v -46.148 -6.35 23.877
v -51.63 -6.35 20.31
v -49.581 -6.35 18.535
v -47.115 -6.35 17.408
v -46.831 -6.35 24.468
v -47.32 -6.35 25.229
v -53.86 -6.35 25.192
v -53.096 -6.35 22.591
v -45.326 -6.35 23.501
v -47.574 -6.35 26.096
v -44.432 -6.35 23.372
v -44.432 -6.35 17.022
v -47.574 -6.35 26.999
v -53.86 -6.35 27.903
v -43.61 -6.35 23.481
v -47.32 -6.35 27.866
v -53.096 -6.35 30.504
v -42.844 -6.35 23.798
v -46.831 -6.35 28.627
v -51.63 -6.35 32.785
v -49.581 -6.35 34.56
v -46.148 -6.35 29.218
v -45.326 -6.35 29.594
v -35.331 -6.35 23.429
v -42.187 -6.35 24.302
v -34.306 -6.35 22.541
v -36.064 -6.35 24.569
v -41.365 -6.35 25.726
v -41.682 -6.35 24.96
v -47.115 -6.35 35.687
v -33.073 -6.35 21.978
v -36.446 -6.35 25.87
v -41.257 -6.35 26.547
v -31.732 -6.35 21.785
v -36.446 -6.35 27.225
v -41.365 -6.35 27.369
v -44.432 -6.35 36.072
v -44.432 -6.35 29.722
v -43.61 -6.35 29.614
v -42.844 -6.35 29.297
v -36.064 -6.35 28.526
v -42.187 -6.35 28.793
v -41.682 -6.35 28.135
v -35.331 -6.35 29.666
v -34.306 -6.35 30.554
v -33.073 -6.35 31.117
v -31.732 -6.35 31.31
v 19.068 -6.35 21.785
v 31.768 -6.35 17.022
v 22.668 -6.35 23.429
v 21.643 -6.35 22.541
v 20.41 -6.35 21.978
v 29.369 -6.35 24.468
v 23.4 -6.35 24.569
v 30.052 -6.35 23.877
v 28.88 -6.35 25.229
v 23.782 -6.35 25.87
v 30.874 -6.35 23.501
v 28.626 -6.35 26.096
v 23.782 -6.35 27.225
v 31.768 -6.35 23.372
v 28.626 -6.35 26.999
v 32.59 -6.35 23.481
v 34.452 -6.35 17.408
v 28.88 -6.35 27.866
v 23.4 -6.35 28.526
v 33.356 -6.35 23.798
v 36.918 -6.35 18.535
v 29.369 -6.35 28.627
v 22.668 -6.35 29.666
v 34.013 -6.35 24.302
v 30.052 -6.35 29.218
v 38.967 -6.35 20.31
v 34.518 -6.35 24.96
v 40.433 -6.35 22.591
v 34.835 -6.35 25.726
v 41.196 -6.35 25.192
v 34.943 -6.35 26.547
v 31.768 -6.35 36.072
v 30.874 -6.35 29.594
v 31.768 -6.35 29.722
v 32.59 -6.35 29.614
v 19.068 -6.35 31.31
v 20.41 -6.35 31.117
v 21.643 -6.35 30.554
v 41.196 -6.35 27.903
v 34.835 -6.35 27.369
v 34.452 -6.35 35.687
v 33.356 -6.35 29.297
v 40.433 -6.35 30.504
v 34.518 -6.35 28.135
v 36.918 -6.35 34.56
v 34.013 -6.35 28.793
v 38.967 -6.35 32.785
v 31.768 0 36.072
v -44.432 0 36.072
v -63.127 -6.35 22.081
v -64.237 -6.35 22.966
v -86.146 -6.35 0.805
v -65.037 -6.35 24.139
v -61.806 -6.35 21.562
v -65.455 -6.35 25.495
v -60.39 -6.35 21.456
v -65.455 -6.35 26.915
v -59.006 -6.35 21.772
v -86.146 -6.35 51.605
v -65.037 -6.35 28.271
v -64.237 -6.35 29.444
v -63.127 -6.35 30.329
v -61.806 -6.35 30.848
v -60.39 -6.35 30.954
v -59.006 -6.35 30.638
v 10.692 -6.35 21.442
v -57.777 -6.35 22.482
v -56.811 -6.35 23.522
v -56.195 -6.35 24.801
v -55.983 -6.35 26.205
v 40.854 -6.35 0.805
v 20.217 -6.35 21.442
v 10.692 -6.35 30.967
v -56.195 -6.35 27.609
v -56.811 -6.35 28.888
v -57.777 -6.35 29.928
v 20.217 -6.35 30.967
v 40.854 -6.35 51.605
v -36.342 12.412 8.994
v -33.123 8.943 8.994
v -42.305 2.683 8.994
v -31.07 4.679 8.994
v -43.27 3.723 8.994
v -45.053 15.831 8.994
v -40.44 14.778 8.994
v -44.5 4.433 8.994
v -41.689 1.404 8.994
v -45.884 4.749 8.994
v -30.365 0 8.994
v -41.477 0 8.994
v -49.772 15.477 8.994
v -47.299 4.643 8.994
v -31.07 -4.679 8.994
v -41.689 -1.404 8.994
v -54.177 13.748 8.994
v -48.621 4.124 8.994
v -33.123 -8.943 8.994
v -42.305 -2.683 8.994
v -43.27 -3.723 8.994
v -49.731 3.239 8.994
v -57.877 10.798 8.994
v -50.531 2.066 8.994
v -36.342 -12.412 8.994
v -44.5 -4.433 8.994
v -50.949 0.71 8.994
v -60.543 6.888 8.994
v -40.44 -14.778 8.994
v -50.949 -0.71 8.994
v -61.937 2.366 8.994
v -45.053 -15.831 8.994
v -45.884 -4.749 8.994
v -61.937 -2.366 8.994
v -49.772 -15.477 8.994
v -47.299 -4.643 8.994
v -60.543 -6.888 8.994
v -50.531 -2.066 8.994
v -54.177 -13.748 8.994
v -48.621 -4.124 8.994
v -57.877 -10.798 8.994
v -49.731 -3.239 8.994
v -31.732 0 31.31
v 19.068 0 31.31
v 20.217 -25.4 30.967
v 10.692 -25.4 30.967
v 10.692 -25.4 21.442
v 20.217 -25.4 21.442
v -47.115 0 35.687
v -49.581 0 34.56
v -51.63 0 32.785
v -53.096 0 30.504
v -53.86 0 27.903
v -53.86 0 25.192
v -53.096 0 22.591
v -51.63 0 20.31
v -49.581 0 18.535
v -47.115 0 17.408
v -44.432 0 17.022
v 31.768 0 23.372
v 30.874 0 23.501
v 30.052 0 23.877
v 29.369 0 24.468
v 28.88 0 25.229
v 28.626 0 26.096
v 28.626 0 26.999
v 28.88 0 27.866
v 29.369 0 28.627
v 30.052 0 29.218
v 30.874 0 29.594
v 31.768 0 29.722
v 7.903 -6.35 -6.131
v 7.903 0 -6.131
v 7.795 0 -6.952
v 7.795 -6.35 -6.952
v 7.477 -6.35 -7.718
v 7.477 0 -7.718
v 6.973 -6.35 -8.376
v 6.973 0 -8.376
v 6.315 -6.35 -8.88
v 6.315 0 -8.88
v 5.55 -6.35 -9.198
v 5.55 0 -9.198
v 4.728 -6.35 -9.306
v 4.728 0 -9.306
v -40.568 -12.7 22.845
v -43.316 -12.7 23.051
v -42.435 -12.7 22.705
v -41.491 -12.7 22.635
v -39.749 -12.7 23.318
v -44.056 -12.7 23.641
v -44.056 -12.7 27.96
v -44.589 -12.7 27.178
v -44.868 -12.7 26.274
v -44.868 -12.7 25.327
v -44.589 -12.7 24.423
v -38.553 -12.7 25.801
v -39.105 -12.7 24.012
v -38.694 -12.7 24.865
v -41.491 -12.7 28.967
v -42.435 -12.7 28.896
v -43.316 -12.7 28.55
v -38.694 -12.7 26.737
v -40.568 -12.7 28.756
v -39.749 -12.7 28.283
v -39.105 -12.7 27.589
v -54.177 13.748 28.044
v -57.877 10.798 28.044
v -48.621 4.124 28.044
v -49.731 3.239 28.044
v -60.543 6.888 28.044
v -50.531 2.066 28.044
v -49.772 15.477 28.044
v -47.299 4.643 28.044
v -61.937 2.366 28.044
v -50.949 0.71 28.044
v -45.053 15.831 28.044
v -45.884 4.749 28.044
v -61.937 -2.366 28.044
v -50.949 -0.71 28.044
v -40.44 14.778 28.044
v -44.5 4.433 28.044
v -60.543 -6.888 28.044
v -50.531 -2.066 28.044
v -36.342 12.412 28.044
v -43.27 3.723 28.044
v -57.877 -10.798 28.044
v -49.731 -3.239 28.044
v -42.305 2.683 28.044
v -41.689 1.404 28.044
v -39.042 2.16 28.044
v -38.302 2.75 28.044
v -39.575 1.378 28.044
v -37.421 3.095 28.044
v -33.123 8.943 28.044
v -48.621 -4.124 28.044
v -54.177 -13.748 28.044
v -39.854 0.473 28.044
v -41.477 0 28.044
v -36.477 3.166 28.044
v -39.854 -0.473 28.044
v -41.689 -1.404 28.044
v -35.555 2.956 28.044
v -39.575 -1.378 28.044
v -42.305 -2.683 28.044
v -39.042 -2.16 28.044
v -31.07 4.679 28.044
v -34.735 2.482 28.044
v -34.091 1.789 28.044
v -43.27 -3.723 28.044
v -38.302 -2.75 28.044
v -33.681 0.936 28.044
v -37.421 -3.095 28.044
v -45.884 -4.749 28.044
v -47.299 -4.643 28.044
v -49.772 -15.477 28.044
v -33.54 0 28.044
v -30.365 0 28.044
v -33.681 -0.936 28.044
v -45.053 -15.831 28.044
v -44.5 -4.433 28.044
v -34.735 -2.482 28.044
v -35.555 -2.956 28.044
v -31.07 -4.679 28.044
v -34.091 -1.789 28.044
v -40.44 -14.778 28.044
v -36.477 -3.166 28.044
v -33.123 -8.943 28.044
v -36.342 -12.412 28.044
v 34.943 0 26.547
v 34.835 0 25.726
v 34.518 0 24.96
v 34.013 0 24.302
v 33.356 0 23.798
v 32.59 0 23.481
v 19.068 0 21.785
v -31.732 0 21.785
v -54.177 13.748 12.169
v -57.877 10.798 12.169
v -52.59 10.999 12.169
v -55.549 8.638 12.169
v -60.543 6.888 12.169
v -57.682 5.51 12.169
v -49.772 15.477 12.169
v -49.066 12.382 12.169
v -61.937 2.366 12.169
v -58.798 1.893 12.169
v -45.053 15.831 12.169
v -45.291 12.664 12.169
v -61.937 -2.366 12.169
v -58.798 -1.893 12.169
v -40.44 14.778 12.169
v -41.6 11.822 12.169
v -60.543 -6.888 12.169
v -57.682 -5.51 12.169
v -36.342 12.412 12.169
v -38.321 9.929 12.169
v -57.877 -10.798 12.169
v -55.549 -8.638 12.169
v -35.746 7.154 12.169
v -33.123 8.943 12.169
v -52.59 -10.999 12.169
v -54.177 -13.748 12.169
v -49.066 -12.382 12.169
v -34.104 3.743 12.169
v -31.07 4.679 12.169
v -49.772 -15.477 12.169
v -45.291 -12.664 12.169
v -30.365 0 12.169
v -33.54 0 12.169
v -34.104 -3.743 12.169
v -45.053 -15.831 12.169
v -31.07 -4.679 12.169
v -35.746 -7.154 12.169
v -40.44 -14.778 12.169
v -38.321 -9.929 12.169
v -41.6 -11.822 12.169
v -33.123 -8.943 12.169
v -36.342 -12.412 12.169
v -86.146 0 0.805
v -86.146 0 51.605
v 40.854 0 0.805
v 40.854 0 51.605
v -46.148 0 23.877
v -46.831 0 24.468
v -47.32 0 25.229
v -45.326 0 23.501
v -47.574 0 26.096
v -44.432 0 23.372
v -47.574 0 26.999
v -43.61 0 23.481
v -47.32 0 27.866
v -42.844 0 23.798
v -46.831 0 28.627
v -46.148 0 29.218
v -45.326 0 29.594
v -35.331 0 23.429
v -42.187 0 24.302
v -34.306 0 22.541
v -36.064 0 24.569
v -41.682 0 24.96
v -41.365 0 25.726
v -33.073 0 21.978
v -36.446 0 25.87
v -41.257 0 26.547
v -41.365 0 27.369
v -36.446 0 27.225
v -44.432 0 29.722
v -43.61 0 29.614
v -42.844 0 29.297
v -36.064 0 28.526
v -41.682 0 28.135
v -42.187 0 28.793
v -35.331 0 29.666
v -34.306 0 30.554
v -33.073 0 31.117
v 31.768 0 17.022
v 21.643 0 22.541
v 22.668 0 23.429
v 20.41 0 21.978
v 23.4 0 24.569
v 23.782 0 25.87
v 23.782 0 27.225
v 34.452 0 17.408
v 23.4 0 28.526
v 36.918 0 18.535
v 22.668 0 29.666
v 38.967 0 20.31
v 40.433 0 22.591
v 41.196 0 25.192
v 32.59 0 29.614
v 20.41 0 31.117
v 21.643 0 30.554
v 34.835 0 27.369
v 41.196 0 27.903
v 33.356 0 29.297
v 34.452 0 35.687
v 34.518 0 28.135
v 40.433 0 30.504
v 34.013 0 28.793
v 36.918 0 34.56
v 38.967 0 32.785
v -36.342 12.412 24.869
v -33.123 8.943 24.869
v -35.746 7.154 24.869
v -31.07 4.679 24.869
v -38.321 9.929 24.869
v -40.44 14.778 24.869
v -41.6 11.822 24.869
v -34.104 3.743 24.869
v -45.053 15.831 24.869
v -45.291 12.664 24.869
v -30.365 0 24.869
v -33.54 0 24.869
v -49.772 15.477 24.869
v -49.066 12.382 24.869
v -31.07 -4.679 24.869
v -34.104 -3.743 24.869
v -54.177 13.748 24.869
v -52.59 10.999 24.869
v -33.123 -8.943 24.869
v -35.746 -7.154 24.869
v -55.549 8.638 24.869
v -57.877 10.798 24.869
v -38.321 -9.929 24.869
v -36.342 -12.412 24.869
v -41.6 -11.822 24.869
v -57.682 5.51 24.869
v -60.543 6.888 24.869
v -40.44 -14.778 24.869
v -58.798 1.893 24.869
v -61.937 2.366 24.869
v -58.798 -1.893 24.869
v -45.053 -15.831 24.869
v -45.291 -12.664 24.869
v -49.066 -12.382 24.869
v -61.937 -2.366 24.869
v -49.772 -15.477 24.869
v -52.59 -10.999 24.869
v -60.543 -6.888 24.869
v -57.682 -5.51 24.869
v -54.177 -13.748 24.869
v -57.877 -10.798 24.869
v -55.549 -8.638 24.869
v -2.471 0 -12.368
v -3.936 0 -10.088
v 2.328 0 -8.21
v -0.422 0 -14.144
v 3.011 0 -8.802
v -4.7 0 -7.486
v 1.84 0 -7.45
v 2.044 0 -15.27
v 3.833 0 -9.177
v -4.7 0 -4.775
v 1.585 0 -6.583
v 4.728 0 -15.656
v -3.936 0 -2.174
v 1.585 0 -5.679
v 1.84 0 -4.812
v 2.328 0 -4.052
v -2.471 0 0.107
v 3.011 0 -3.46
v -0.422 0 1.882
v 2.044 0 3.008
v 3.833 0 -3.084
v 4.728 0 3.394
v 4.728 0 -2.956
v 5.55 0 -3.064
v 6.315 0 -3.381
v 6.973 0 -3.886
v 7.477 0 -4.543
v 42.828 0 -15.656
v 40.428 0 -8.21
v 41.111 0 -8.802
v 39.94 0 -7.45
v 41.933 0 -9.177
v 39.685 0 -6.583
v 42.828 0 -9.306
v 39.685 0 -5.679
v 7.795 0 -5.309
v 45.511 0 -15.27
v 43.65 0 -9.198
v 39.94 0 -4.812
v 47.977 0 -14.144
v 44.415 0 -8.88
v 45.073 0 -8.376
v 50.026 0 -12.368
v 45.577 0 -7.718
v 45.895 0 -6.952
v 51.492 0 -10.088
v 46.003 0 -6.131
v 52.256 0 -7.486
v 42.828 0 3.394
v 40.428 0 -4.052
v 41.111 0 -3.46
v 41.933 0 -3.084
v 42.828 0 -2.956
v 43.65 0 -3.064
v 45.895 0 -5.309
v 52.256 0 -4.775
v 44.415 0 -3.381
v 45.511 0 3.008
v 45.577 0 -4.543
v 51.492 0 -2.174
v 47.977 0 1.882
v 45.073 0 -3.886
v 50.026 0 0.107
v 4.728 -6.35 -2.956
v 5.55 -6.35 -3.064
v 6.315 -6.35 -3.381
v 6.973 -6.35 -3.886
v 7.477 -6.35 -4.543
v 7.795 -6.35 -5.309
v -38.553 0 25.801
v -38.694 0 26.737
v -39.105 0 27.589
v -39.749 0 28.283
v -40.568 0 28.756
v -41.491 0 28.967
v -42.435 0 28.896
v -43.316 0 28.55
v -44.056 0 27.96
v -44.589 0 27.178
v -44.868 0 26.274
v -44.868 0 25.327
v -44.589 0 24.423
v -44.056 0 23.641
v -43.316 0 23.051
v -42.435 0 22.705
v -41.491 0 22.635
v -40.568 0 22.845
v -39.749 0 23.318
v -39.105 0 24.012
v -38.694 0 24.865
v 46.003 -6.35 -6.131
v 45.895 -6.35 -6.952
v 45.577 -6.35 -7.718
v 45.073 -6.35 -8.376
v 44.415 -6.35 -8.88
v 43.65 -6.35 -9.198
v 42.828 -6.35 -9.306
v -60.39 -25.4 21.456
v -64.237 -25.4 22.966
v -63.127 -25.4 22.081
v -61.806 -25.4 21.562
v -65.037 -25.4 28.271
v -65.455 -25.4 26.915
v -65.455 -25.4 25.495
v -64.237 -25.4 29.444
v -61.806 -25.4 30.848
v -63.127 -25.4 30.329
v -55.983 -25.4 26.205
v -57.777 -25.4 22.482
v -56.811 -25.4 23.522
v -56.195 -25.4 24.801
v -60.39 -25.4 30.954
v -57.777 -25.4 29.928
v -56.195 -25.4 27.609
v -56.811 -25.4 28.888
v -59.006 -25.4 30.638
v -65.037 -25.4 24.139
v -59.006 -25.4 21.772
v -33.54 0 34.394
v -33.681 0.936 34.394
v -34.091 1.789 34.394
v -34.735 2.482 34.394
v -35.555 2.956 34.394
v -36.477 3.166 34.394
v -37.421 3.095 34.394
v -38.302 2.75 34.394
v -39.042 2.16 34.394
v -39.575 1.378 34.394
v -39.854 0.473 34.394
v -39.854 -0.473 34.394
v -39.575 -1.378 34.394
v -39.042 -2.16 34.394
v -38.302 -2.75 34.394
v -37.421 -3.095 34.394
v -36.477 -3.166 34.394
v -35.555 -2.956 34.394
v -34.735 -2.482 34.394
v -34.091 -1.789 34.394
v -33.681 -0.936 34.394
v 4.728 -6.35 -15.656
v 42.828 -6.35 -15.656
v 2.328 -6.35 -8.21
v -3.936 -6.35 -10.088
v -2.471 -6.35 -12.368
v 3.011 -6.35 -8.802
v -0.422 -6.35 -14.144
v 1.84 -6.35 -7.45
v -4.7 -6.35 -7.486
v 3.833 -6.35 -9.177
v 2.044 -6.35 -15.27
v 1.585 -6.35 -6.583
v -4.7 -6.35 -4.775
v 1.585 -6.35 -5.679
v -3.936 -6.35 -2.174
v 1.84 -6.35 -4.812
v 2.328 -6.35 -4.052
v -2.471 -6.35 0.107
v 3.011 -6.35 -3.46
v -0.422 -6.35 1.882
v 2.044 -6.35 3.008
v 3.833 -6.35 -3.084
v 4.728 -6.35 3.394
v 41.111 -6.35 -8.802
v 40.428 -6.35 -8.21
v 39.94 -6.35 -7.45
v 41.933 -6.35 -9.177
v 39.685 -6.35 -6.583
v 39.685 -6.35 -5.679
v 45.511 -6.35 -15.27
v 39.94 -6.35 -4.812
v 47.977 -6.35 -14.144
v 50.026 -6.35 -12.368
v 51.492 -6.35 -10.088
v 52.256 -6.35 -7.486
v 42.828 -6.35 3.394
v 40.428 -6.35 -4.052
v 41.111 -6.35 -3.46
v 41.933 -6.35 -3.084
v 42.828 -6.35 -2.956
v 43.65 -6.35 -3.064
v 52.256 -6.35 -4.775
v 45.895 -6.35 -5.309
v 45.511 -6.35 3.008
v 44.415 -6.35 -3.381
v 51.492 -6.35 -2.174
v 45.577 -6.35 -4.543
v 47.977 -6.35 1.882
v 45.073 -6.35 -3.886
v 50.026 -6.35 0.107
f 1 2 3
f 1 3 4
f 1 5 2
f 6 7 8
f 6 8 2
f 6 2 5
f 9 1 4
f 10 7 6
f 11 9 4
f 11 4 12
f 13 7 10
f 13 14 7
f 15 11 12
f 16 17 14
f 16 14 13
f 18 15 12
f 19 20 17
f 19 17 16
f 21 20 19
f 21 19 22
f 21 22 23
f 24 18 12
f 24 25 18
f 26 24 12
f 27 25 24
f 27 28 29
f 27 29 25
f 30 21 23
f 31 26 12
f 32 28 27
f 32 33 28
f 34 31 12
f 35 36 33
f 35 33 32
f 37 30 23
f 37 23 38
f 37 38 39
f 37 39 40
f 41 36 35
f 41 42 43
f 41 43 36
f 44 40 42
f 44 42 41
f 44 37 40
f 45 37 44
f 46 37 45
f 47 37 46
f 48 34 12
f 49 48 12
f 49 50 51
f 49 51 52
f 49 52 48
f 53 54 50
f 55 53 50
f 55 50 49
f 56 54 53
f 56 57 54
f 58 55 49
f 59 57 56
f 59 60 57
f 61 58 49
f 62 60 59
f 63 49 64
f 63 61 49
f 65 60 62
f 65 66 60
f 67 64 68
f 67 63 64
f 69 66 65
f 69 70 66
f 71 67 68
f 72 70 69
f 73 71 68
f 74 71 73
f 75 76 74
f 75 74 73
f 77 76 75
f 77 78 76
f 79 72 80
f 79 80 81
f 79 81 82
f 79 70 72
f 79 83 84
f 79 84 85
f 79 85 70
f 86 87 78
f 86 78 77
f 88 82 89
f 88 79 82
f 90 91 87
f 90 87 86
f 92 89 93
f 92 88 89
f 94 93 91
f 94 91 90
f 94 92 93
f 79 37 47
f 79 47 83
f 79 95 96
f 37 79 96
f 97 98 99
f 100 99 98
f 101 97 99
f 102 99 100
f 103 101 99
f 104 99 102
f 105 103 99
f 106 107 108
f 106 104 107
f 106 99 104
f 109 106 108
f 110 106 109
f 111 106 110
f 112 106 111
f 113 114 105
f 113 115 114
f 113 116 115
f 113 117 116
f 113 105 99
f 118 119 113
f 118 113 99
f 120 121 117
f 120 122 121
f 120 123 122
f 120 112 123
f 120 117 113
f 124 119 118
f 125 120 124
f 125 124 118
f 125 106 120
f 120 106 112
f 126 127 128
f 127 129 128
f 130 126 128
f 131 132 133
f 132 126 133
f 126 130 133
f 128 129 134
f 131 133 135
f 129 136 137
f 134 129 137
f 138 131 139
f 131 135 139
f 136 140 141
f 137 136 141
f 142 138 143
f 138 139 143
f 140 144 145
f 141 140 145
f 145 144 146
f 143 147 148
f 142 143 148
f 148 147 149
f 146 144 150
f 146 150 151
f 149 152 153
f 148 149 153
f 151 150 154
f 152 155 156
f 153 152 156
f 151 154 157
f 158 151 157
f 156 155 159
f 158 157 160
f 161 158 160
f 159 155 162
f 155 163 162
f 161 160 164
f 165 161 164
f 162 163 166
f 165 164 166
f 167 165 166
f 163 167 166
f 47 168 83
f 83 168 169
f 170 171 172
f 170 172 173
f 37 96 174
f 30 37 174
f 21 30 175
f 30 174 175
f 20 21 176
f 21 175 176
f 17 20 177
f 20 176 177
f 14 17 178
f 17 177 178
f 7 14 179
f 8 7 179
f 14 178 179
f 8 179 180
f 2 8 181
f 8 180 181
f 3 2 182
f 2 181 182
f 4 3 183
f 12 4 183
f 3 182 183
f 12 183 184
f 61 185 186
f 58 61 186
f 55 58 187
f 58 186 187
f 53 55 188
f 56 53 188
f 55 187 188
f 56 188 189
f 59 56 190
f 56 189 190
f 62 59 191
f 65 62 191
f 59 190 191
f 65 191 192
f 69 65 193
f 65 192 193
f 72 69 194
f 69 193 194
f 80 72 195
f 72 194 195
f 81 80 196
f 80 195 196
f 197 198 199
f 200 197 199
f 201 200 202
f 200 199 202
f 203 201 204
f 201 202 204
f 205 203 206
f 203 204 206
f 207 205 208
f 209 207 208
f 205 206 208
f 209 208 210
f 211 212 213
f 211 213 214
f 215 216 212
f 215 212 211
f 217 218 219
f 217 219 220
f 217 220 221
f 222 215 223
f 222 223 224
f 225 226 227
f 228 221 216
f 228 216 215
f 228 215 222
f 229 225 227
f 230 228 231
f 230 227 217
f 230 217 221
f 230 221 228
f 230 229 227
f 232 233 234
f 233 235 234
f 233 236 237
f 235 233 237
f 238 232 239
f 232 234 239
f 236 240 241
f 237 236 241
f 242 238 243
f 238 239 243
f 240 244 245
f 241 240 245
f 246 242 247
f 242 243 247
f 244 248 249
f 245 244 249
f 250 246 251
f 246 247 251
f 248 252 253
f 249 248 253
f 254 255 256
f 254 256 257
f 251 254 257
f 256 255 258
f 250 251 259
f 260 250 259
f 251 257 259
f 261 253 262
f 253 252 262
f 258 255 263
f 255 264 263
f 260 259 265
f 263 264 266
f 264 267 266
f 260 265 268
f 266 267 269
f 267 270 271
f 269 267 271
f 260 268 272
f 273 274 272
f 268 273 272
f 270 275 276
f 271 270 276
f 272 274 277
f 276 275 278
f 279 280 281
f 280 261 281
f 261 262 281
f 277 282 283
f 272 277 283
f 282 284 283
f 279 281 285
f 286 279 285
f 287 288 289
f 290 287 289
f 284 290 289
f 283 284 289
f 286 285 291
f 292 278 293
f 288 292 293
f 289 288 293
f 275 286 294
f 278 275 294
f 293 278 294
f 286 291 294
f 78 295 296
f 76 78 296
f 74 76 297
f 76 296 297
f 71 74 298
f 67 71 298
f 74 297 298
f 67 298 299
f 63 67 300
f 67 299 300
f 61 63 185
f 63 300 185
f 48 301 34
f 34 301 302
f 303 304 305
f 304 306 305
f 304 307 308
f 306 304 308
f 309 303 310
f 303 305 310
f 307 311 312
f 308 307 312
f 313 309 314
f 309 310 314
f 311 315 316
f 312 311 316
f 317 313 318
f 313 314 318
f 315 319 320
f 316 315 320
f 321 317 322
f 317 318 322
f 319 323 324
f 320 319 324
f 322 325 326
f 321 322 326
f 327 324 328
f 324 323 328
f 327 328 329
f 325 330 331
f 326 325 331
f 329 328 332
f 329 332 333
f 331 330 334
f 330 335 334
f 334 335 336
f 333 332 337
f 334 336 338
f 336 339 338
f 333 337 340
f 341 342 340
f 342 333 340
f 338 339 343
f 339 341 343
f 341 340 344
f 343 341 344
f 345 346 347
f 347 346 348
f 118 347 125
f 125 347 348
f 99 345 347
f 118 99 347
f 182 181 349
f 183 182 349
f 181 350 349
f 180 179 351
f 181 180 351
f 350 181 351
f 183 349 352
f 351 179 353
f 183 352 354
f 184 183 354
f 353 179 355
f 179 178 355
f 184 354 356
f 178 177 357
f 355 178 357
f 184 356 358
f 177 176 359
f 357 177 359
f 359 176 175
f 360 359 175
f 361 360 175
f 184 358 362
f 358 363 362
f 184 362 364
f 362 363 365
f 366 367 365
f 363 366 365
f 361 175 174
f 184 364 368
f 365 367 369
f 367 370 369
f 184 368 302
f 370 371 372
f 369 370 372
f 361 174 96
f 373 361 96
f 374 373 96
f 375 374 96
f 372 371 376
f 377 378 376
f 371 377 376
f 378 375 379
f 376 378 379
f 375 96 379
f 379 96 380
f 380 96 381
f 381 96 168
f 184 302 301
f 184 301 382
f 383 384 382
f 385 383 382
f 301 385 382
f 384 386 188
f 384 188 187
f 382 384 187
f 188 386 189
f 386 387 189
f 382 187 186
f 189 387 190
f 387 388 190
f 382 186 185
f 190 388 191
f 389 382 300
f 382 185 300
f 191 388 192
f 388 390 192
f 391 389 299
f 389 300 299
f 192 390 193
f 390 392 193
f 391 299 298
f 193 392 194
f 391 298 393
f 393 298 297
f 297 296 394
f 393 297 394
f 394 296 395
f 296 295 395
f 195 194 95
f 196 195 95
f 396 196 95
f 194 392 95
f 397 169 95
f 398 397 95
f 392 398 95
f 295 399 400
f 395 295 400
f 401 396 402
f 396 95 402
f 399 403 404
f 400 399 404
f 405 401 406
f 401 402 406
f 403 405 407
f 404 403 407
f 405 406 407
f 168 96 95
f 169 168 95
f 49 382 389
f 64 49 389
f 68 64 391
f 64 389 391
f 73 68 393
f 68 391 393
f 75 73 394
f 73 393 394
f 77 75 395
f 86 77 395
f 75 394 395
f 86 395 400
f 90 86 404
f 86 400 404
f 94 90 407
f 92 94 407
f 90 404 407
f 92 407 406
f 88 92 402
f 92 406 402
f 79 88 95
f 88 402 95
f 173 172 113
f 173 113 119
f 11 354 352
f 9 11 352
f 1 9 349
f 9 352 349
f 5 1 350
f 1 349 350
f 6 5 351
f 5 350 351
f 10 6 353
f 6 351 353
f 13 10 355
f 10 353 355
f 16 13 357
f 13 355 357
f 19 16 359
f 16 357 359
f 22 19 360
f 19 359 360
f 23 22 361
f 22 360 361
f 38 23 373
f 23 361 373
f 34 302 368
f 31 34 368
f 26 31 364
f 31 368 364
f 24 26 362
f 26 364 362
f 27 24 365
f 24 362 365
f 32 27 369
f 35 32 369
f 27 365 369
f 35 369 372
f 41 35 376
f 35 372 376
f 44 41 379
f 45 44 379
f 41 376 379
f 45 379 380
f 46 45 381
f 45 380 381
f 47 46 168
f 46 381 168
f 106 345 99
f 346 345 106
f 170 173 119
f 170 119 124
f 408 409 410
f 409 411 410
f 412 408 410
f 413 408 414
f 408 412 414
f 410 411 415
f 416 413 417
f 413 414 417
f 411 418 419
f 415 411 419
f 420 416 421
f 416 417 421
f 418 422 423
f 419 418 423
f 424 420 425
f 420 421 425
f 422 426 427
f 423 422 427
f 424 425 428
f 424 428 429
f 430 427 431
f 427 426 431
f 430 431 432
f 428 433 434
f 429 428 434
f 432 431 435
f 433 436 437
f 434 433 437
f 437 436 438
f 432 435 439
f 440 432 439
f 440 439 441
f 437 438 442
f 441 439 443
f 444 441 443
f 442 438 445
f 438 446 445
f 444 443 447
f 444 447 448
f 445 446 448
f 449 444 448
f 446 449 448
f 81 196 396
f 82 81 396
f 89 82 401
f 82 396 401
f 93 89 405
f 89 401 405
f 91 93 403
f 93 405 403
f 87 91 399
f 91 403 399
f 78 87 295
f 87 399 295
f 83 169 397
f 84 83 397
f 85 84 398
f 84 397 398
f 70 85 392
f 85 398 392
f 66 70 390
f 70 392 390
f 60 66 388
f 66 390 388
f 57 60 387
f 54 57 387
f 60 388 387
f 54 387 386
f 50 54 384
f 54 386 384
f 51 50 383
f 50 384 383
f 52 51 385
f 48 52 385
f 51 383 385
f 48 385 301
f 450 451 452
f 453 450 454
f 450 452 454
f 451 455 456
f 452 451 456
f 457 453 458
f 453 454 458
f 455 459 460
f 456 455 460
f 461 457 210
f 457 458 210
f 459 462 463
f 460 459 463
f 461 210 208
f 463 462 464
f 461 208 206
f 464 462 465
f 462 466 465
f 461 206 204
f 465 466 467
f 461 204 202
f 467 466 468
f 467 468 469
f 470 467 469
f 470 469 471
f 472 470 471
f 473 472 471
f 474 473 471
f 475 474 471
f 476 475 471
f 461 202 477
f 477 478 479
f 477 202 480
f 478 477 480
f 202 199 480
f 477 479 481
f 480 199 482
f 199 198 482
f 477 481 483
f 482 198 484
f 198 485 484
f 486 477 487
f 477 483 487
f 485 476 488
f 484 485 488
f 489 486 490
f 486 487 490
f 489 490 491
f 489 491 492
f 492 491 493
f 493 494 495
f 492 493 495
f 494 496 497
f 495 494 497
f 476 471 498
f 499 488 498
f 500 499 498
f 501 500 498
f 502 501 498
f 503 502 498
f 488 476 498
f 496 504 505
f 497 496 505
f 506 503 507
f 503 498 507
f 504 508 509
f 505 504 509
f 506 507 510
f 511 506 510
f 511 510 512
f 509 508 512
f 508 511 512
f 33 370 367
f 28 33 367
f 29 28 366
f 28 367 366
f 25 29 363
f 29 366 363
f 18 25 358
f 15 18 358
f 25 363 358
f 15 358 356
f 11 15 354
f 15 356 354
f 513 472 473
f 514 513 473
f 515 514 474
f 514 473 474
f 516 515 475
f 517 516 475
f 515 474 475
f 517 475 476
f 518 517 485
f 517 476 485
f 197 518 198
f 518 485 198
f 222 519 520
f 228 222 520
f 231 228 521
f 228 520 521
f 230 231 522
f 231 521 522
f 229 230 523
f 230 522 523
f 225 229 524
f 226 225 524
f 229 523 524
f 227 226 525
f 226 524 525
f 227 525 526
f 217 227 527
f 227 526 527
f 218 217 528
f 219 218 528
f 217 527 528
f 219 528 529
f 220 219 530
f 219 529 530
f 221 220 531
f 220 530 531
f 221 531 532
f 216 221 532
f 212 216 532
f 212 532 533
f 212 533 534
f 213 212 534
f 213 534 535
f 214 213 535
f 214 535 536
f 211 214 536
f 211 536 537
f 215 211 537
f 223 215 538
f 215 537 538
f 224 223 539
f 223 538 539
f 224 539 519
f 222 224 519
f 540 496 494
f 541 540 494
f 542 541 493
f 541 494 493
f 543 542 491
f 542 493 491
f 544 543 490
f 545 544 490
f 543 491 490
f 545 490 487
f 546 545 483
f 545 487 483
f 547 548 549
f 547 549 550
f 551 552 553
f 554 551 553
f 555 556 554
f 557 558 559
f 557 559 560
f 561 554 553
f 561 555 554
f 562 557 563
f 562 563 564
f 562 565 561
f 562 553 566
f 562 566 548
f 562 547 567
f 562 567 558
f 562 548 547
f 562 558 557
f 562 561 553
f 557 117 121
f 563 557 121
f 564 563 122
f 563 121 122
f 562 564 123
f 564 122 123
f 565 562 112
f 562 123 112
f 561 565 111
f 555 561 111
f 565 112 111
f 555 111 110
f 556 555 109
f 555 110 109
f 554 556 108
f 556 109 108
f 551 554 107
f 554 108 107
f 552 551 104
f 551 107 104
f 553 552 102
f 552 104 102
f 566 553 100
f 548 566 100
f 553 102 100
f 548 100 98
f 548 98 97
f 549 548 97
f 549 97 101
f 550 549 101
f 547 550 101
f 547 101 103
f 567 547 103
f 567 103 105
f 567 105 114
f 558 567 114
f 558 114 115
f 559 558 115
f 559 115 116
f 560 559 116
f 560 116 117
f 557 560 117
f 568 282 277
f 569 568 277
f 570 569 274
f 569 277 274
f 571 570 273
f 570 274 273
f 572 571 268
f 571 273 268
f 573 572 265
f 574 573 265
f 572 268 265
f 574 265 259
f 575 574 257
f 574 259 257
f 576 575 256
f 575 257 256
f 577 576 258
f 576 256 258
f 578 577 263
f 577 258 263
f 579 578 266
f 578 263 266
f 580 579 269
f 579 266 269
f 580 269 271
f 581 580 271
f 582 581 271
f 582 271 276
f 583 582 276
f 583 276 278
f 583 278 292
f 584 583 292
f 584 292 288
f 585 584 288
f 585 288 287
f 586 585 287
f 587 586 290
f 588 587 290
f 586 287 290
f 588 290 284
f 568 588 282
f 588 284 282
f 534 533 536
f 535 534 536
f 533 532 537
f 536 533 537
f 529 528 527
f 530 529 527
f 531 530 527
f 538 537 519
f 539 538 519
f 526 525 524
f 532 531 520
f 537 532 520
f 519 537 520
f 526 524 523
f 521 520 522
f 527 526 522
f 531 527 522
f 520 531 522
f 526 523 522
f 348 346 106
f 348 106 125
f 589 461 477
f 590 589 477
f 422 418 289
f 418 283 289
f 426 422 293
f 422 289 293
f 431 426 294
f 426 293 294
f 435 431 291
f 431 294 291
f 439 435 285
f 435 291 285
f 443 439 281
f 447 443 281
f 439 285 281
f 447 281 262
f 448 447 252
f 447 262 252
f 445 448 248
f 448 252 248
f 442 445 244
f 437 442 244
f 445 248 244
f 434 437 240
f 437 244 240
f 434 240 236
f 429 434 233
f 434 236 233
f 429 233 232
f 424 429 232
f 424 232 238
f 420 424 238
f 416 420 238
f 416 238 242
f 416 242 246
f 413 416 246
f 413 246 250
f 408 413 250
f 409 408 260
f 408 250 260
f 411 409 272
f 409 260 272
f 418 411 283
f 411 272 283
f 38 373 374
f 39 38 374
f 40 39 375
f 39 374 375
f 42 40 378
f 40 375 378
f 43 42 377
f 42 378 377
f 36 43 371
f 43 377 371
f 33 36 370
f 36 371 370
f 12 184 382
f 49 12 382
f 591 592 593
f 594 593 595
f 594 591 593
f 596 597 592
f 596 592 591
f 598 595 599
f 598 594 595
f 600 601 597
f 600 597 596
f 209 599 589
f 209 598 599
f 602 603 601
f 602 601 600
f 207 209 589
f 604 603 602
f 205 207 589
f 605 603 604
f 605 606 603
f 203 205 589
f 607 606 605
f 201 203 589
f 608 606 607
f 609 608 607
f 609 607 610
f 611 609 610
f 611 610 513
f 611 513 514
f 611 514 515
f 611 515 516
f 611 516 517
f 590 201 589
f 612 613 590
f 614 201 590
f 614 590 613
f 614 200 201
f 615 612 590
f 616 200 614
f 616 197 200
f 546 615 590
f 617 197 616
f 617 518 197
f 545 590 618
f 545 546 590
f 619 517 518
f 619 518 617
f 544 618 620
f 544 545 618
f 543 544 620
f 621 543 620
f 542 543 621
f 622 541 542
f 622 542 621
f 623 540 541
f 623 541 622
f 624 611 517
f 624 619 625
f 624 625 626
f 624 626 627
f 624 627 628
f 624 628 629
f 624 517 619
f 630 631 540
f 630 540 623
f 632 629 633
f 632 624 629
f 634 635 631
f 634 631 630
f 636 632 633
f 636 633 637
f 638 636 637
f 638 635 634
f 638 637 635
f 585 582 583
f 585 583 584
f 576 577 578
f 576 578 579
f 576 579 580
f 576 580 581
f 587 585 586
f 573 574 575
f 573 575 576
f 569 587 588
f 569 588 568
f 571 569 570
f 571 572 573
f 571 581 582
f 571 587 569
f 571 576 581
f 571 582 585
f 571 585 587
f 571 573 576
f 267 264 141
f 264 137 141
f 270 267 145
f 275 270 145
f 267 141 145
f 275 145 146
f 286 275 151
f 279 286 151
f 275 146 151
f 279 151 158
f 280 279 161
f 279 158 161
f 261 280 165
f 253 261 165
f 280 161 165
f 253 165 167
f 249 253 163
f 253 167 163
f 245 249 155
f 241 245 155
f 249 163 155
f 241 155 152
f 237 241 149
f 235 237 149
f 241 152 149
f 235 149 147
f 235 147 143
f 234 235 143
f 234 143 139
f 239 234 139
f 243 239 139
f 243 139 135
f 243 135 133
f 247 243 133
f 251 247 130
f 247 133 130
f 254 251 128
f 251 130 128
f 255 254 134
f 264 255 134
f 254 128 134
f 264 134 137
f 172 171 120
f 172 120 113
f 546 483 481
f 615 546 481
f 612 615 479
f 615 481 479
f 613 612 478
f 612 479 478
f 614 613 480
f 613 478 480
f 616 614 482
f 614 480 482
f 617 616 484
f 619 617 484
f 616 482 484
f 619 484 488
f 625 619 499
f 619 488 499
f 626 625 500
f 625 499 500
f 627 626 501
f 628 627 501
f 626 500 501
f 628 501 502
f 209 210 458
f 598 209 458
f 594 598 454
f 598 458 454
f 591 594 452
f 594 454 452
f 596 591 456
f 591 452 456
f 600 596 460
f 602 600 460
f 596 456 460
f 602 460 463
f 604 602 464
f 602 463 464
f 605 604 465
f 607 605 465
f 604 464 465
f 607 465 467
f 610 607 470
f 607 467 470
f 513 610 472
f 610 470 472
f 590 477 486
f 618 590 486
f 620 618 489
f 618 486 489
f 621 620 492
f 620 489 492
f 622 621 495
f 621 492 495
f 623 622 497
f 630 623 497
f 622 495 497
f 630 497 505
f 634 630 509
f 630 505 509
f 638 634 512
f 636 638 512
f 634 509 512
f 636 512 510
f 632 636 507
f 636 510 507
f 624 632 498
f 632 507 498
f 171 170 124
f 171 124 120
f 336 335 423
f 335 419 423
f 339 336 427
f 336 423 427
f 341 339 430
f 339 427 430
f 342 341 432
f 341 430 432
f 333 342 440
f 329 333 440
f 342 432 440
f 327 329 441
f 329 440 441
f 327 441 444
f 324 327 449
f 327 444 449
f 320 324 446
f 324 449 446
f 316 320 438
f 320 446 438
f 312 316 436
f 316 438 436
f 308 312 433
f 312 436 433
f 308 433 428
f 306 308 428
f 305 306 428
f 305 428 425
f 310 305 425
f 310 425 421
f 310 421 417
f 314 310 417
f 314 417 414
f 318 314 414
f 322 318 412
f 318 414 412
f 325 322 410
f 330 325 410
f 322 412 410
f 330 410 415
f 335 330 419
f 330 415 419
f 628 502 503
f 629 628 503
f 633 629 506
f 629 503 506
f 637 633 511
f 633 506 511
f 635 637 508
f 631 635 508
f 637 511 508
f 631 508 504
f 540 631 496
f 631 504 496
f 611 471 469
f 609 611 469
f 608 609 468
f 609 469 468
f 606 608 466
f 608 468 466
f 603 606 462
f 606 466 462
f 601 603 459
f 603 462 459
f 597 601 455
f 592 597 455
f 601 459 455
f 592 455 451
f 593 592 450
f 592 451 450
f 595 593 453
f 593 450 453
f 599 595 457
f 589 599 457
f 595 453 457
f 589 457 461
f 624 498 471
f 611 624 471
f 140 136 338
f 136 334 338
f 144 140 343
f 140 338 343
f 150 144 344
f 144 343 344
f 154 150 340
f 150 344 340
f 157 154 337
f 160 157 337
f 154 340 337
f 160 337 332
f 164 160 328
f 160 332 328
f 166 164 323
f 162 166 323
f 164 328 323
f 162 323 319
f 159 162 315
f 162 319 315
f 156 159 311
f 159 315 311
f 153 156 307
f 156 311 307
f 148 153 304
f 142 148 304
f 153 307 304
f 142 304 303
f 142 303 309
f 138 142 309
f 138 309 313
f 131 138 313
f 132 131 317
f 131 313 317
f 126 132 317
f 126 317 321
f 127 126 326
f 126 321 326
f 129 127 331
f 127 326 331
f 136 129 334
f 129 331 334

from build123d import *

# Parameters (mm, degrees)
F0_W      = 127
F0_H      = 50.8
F0_R      = 4.7625
F1_DEPTH  = 6.35
F2_DEPTH  = 25.4
F4_DEPTH  = 6.35
F6_DEPTH  = 6.35
F7_R      = 3.175
F8_DEPTH  = 12.7
F9_W      = 7.9375
F9_H      = 12.7
F11_R     = 3.175
F12_DEPTH = 6.35


with BuildPart() as f1:
    # F0 (on Front) → F1 (new body)
    with BuildSketch(Plane.XZ):
        with Locations((-22.645993565, 26.2049915612)):
            Rectangle(F0_W, F0_H)
        with Locations((-60.745993565, 26.2049915612)):
            Circle(F0_R, mode=Mode.SUBTRACT)
        Polygon((10.691506435, 21.4424915612), (10.691506435, 30.9674915612), (20.216506435, 30.9674915612), (20.216506435, 26.2049915612), (20.216506435, 21.4424915612), (15.454006435, 21.4424915612), align=None, mode=Mode.SUBTRACT)
    extrude(amount=F1_DEPTH)

    # F0 (on Front) → F2 (join)
    with BuildSketch(Plane.XZ):
        with Locations((-60.745993565, 26.2049915612)):
            Circle(F0_R)
        Polygon((20.216506435, 30.9674915612), (10.691506435, 30.9674915612), (10.691506435, 21.4424915612), (15.454006435, 21.4424915612), (20.216506435, 21.4424915612), (20.216506435, 26.2049915612), align=None)
    extrude(amount=F2_DEPTH)


with BuildPart() as f4:
    # F3 (on Front) → F4 (new body)
    with BuildSketch(Plane.XZ):
        with BuildLine():
            Line((4.727822268, -2.9557410955), (4.727822268, 3.3942589045))
            ThreePointArc((4.727822268, 3.3942589045), (-4.797177732, -6.1307410955), (4.727822268, -15.6557410955))
            Line((4.727822268, -15.6557410955), (4.727822268, -9.3057410955))
            ThreePointArc((4.727822268, -9.3057410955), (1.552822268, -6.1307410955), (4.727822268, -2.9557410955))
        make_face()
        with BuildLine():
            Line((42.827822268, 3.3942589045), (4.727822268, 3.3942589045))
            Line((4.727822268, 3.3942589045), (4.727822268, -2.9557410955))
            ThreePointArc((4.727822268, -2.9557410955), (6.9728862983, -3.8856770653), (7.902822268, -6.1307410955))
            ThreePointArc((7.902822268, -6.1307410955), (6.9728862983, -8.3758051258), (4.727822268, -9.3057410955))
            Line((4.727822268, -9.3057410955), (4.727822268, -15.6557410955))
            Line((4.727822268, -15.6557410955), (42.827822268, -15.6557410955))
            Line((42.827822268, -15.6557410955), (42.827822268, -9.3057410955))
            ThreePointArc((42.827822268, -9.3057410955), (39.652822268, -6.1307410955), (42.827822268, -2.9557410955))
            Line((42.827822268, -2.9557410955), (42.827822268, 3.3942589045))
        make_face()
        with BuildLine():
            ThreePointArc((42.827822268, -15.6557410955), (52.352822268, -6.1307410955), (42.827822268, 3.3942589045))
            Line((42.827822268, 3.3942589045), (42.827822268, -2.9557410955))
            ThreePointArc((42.827822268, -2.9557410955), (45.0728862983, -3.8856770653), (46.002822268, -6.1307410955))
            ThreePointArc((46.002822268, -6.1307410955), (45.0728862983, -8.3758051258), (42.827822268, -9.3057410955))
            Line((42.827822268, -9.3057410955), (42.827822268, -15.6557410955))
        make_face()
    extrude(amount=F4_DEPTH)


with BuildPart() as f6:
    # F5 (on Front) → F6 (new body)
    with BuildSketch(Plane.XZ):
        with BuildLine():
            Line((-44.4316556573, 29.722497952), (-44.4316556573, 36.072497952))
            ThreePointArc((-44.4316556573, 36.072497952), (-53.9566556573, 26.547497952), (-44.4316556573, 17.022497952))
            Line((-44.4316556573, 17.022497952), (-44.4316556573, 23.372497952))
            ThreePointArc((-44.4316556573, 23.372497952), (-47.6066556573, 26.547497952), (-44.4316556573, 29.722497952))
        make_face()
        with BuildLine():
            Line((31.7683443427, 36.072497952), (-44.4316556573, 36.072497952))
            Line((-44.4316556573, 36.072497952), (-44.4316556573, 29.722497952))
            ThreePointArc((-44.4316556573, 29.722497952), (-42.186591627, 28.7925619823), (-41.2566556573, 26.547497952))
            ThreePointArc((-41.2566556573, 26.547497952), (-42.186591627, 24.3024339217), (-44.4316556573, 23.372497952))
            Line((-44.4316556573, 23.372497952), (-44.4316556573, 17.022497952))
            Line((-44.4316556573, 17.022497952), (-6.3316556573, 17.022497952))
            Line((-6.3316556573, 17.022497952), (31.7683443427, 17.022497952))
            Line((31.7683443427, 17.022497952), (31.7683443427, 23.372497952))
            ThreePointArc((31.7683443427, 23.372497952), (28.5933443427, 26.547497952), (31.7683443427, 29.722497952))
            Line((31.7683443427, 29.722497952), (31.7683443427, 36.072497952))
        make_face()
        with BuildLine():
            ThreePointArc((-31.7316556573, 21.784997952), (-36.4941556573, 26.547497952), (-31.7316556573, 31.309997952))
            Line((-31.7316556573, 31.309997952), (19.0683443427, 31.309997952))
            ThreePointArc((19.0683443427, 31.309997952), (23.8308443427, 26.547497952), (19.0683443427, 21.784997952))
            Line((19.0683443427, 21.784997952), (-6.3316556573, 21.784997952))
            Line((-6.3316556573, 21.784997952), (-31.7316556573, 21.784997952))
        make_face(mode=Mode.SUBTRACT)
        with BuildLine():
            ThreePointArc((31.7683443427, 17.022497952), (41.2933443427, 26.547497952), (31.7683443427, 36.072497952))
            Line((31.7683443427, 36.072497952), (31.7683443427, 29.722497952))
            ThreePointArc((31.7683443427, 29.722497952), (34.013408373, 28.7925619823), (34.9433443427, 26.547497952))
            ThreePointArc((34.9433443427, 26.547497952), (34.013408373, 24.3024339217), (31.7683443427, 23.372497952))
            Line((31.7683443427, 23.372497952), (31.7683443427, 17.022497952))
        make_face()
    extrude(amount=F6_DEPTH)


with BuildPart() as f8:
    # F7 (on Front) → F8 (new body)
    with BuildSketch(Plane.XZ):
        with Locations((-41.7281500995, 25.8006639779)):
            Circle(F7_R)
    extrude(amount=F8_DEPTH)


with BuildPart() as f10:
    # F9 (on Front) → F10 (revolve)
    with BuildSketch(Plane.XZ):
        Polygon((-30.3646791726, 28.0442315072), (-41.4771791726, 28.0442315072), (-41.4771791726, 24.8692315072), (-33.5396791726, 24.8692315072), (-30.3646791726, 24.8692315072), align=None)
        with Locations((-37.5084291726, 18.5192315072)):
            Rectangle(F9_W, F9_H)
        Polygon((-33.5396791726, 12.1692315072), (-41.4771791726, 12.1692315072), (-41.4771791726, 8.9942315072), (-30.3646791726, 8.9942315072), (-30.3646791726, 12.1692315072), align=None)
    revolve(axis=Axis((-46.2396791726, 0, 18.5192315072), (0, 0, -1)))

    # F11 (on face) → F12 (join)
    with BuildSketch(Plane.XY.offset(28.0442315072)):
        with Locations((-36.7146791726, 0)):
            Circle(F11_R)
    extrude(amount=F12_DEPTH)


solid = Compound([f1.part, f4.part, f6.part, f8.part, f10.part])
